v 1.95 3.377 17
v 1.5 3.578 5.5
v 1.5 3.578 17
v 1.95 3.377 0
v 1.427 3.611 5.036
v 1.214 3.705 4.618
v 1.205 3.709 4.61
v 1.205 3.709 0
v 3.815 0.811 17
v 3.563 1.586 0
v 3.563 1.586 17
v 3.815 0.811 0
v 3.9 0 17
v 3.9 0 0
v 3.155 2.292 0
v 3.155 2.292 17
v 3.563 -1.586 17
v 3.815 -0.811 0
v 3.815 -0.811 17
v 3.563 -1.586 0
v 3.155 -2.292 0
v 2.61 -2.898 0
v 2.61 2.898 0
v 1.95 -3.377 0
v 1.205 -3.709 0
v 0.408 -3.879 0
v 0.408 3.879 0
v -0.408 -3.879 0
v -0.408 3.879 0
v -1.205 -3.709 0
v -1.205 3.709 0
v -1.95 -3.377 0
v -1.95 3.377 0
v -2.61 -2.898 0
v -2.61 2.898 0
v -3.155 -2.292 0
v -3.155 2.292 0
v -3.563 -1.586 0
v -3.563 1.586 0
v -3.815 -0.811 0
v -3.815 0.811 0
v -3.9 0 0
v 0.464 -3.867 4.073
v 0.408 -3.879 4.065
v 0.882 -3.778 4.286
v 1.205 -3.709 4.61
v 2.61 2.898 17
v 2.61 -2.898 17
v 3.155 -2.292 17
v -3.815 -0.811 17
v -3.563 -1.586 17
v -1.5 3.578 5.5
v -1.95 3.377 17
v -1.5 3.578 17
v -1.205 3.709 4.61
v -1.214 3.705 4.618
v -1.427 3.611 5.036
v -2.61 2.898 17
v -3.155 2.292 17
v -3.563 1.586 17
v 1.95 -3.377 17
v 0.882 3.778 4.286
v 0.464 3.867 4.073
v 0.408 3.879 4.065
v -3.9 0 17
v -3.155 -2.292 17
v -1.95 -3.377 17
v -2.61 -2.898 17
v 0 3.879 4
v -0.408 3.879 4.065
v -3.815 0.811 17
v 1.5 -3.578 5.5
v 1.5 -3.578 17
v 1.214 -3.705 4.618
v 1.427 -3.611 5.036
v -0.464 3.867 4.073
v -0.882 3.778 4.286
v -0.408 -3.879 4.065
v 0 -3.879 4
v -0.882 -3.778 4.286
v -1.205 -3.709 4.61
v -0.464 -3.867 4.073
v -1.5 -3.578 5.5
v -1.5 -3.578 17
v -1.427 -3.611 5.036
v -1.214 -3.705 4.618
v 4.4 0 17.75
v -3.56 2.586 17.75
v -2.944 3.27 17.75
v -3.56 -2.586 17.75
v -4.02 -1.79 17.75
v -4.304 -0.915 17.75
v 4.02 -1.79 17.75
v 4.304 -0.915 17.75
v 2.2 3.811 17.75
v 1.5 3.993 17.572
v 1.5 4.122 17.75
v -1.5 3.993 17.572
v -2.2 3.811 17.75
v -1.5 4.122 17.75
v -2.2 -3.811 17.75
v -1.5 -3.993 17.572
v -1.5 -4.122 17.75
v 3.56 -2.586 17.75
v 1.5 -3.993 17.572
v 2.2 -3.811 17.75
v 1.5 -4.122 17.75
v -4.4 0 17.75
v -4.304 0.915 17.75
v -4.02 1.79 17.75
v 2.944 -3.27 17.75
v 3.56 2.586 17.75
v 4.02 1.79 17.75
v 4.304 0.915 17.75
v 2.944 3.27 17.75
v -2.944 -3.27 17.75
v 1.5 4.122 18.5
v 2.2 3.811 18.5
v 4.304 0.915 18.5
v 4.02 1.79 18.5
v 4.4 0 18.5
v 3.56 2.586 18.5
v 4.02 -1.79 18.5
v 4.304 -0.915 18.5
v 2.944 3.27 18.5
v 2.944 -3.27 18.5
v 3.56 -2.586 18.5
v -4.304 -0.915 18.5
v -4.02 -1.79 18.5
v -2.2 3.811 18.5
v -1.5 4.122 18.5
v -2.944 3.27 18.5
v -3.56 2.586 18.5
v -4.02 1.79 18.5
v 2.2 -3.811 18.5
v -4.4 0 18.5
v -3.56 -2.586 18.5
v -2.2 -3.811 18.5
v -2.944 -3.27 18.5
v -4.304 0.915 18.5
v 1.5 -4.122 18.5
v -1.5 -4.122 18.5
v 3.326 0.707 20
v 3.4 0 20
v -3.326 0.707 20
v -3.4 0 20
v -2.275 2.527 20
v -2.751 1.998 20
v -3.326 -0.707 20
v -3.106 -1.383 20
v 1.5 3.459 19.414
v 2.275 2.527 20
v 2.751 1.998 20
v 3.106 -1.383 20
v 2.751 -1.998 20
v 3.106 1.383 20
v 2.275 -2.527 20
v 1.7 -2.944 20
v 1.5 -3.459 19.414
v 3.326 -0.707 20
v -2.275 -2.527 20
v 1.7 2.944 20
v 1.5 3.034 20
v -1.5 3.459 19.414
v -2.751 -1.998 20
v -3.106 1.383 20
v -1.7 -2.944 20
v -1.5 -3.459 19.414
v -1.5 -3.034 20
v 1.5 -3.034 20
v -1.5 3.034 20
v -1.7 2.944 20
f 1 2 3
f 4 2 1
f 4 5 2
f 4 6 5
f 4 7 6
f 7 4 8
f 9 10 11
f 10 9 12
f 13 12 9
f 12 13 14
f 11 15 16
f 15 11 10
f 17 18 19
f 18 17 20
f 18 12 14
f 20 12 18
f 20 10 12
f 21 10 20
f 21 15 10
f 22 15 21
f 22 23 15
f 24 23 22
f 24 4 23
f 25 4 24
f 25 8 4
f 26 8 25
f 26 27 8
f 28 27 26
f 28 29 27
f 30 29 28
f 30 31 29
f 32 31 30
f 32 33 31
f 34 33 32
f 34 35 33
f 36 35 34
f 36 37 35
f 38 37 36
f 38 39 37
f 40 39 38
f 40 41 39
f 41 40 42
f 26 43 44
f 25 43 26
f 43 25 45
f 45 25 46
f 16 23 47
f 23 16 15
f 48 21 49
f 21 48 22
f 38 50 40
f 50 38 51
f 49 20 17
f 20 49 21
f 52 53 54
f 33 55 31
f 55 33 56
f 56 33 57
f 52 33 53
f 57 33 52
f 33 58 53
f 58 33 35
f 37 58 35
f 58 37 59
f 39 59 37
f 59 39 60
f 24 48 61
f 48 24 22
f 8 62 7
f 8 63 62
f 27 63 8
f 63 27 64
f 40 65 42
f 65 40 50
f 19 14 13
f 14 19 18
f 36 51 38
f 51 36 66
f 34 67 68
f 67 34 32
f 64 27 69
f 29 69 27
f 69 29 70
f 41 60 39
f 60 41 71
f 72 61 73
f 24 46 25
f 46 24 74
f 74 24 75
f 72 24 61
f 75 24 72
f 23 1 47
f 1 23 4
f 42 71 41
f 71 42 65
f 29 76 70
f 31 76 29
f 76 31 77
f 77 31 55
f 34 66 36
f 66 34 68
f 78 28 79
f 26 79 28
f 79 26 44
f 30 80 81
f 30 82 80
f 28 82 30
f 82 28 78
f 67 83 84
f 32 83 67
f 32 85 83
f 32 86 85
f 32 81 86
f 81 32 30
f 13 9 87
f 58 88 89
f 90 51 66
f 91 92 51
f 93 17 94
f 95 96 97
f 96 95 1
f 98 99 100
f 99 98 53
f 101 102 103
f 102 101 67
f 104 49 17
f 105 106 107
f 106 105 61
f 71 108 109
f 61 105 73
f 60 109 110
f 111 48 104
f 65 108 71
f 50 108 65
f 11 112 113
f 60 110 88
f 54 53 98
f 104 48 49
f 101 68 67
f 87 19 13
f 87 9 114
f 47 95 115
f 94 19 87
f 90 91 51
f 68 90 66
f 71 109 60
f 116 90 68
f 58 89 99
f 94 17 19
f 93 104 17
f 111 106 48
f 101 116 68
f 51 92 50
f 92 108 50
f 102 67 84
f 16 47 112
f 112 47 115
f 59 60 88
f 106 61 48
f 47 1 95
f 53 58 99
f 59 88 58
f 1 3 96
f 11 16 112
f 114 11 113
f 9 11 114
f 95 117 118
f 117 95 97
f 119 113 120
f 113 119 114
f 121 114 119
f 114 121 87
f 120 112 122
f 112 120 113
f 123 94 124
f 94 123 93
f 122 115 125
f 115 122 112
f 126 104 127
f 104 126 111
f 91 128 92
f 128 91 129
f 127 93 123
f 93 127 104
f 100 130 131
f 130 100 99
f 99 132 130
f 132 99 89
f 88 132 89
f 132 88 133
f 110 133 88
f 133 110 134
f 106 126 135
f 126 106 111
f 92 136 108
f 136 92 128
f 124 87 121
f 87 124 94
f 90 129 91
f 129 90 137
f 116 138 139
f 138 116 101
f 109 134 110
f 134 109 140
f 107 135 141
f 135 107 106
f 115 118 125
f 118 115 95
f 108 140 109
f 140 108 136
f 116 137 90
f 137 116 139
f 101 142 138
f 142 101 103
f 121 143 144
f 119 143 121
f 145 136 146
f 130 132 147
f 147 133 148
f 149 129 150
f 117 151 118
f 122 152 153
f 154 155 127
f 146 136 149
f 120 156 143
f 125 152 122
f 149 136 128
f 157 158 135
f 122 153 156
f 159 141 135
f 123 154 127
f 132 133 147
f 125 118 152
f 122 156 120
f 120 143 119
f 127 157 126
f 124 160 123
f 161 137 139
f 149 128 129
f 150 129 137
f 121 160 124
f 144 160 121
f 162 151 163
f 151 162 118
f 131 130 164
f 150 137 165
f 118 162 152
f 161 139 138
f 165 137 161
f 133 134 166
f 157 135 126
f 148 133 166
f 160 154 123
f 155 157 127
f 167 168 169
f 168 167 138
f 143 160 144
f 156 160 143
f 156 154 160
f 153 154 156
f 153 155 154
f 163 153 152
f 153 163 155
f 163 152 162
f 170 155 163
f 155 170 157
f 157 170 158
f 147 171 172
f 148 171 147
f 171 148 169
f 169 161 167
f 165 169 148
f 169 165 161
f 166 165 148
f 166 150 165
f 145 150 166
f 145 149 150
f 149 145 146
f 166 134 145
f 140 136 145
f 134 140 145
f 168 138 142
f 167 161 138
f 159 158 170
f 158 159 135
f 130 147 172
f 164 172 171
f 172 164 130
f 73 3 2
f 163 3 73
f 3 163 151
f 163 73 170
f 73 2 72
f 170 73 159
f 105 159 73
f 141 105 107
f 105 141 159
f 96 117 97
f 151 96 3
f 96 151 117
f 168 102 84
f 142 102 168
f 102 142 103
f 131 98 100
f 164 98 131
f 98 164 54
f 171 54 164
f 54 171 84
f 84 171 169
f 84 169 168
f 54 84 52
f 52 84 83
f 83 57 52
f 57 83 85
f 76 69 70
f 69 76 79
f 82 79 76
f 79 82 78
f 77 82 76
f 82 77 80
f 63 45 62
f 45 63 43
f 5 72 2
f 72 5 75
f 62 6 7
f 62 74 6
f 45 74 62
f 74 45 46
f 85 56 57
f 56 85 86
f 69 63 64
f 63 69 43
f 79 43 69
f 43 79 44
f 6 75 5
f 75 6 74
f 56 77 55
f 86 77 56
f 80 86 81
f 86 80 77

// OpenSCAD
// Pin Connectors V3
// Tony Buser <tbuser@gmail.com>
// Modified by Emmett Lalish

object=0;//[0:pin,1:pinpeg,2:pinhole]
length=20;
diameter=8;
//Only affects pinhole
hole_twist=0;//[0:free,1:fixed]
//Only affects pinhole
hole_friction=0;//[0:loose,1:tight]
//Radial gap to help pins fit into tight holes
pin_tolerance=0.2;
//Extra gap to make loose hole
loose=0.3;
lip_height=3;
lip_thickness=1;
hf=hole_friction==0 ? false : true;
ht=hole_twist==0 ? false : true;

if(object==0)pin(h=length,r=diameter/2,lh=lip_height,lt=lip_thickness,t=pin_tolerance);
if(object==1)pinpeg(h=length,r=diameter/2,lh=lip_height,lt=lip_thickness,t=pin_tolerance);
if(object==2)pinhole(h=length,r=diameter/2,lh=lip_height,lt=lip_thickness,t=loose,
	tight=hf,fixed=ht);

module test() {
  tolerance = 0.3;
  
  translate([-12, 12, 0]) pinpeg(h=20);
  translate([12, 12, 0]) pintack(h=10);
  
  difference() {
    union() {
      translate([0, -12, 2.5]) cube(size = [59, 20, 5], center = true);
      translate([24, -12, 7.5]) cube(size = [12, 20, 15], center = true);
    }
    translate([-24, -12, 0]) pinhole(h=5, t=tolerance);
    translate([-12, -12, 0]) pinhole(h=5, t=tolerance, tight=false);
    translate([0, -12, 0]) pinhole(h=10, t=tolerance);
    translate([12, -12, 0]) pinhole(h=10, t=tolerance, tight=false);
    translate([24, -12, 15]) rotate([0, 180, 0]) pinhole(h=10, t=tolerance);
  }
}

module pinhole(h=10, r=4, lh=3, lt=1, t=0.3, tight=true, fixed=false) {
  // h = shaft height
  // r = shaft radius
  // lh = lip height
  // lt = lip thickness
  // t = extra tolerance for loose fit
  // tight = set to false if you want a joint that spins easily
  // fixed = set to true so pins can't spin
  
intersection(){
  union() {
	if (tight == true || fixed == true) {
      pin_solid(h, r, lh, lt);
	  translate([0,0,-t/2])cylinder(h=h+t, r=r, $fn=30);
	} else {
	  pin_solid(h, r+t/2, lh, lt);
	  translate([0,0,-t/2])cylinder(h=h+t, r=r+t/2, $fn=30);
	}
    
    
    // widen the entrance hole to make insertion easier
    //translate([0, 0, -0.1]) cylinder(h=lh/3, r2=r, r1=r+(t/2)+(lt/2),$fn=30);
  }
  if (fixed == true) {
	translate([-r*2, -r*0.75, -1])cube([r*4, r*1.5, h+2]);
  }
}}

module pin(h=10, r=4, lh=3, lt=1, t=0.2, side=false) {
  // h = shaft height
  // r = shaft radius
  // lh = lip height
  // lt = lip thickness
  // side = set to true if you want it printed horizontally

  if (side) {
    pin_horizontal(h, r, lh, lt, t);
  } else {
    pin_vertical(h, r, lh, lt, t);
  }
}

module pintack(h=10, r=4, lh=3, lt=1, t=0.2, bh=3, br=8.75) {
  // bh = base_height
  // br = base_radius
  
  union() {
    cylinder(h=bh, r=br);
    translate([0, 0, bh]) pin(h, r, lh, lt, t);
  }
}

module pinpeg(h=20, r=4, lh=3, lt=1, t=0.2) {
  union() {
    translate([0,-0.05, 0]) pin(h/2+0.1, r, lh, lt, t, side=true);
    translate([0,0.05, 0]) rotate([0, 0, 180]) pin(h/2+0.1, r, lh, lt, t, side=true);
  }
}

// just call pin instead, I made this module because it was easier to do the rotation option this way
// since openscad complains of recursion if I did it all in one module
module pin_vertical(h=10, r=4, lh=3, lt=1, t=0.2, cut=false) {
  // h = shaft height
  // r = shaft radius
  // lh = lip height
  // lt = lip thickness

  difference() {
    pin_solid(h, r-t/2, lh, lt);
    
    // center cut
    translate([-lt*3/2, -(r*2+lt*2)/2, h/5+lt*3/2]) cube([lt*3, r*2+lt*2, h]);
    //translate([0, 0, h/4]) cylinder(h=h+lh, r=r/2.5, $fn=20);
    // center curve
    translate([0, 0, h/5+lt*3/2]) rotate([90, 0, 0]) cylinder(h=r*2, r=lt*3/2, center=true, $fn=20);
  
    // side cuts
    if(cut==true){
        translate([-r*2, -r-r*0.75+t/2, -1]) cube([r*4, r, h+2]);
        translate([-r*2, r*0.75-t/2, -1]) cube([r*4, r, h+2]);
    }
  }
}

// call pin with side=true instead of this
module pin_horizontal(h=10, r=4, lh=3, lt=1, t=0.2) {
  // h = shaft height
  // r = shaft radius
  // lh = lip height
  // lt = lip thickness
  translate([0, 0, r*0.75-t/2]) rotate([-90, 0, 0]) pin_vertical(h, r, lh, lt, t);
}

// this is mainly to make the pinhole module easier
module pin_solid(h=10, r=4, lh=3, lt=1) {
  union() {
    // shaft
    cylinder(h=h-lh, r=r, $fn=30);
    // lip
    // translate([0, 0, h-lh]) cylinder(h=lh*0.25, r1=r, r2=r+(lt/2), $fn=30);
    // translate([0, 0, h-lh+lh*0.25]) cylinder(h=lh*0.25, r2=r, r1=r+(lt/2), $fn=30);
    // translate([0, 0, h-lh+lh*0.50]) cylinder(h=lh*0.50, r1=r, r2=r-(lt/2), $fn=30);

    // translate([0, 0, h-lh]) cylinder(h=lh*0.50, r1=r, r2=r+(lt/2), $fn=30);
    // translate([0, 0, h-lh+lh*0.50]) cylinder(h=lh*0.50, r1=r+(lt/2), r2=r-(lt/3), $fn=30);    

    translate([0, 0, h-lh]) cylinder(h=lh*0.25, r1=r, r2=r+(lt/2), $fn=30);
    translate([0, 0, h-lh+lh*0.25]) cylinder(h=lh*0.25, r=r+(lt/2), $fn=30);    
    translate([0, 0, h-lh+lh*0.50]) cylinder(h=lh*0.50, r1=r+(lt/2), r2=r-(lt/2), $fn=30);    

    // translate([0, 0, h-lh]) cylinder(h=lh, r1=r+(lt/2), r2=1, $fn=30);
    // translate([0, 0, h-lh-lt/2]) cylinder(h=lt/2, r1=r, r2=r+(lt/2), $fn=30);
  }
}

module pinshaft(h=10, r=4, t=0.2, side=false){
flip=side ? 1 : 0;
translate(flip*[0,h/2,r*0.75-t/2])rotate(flip*[90,0,0])
intersection(){
	cylinder(h=h, r=r-t/2, $fn=30);
	translate([-r*2, -r*0.75+t/2, -1])cube([r*4, r*1.5-t, h+2]);
}
}
